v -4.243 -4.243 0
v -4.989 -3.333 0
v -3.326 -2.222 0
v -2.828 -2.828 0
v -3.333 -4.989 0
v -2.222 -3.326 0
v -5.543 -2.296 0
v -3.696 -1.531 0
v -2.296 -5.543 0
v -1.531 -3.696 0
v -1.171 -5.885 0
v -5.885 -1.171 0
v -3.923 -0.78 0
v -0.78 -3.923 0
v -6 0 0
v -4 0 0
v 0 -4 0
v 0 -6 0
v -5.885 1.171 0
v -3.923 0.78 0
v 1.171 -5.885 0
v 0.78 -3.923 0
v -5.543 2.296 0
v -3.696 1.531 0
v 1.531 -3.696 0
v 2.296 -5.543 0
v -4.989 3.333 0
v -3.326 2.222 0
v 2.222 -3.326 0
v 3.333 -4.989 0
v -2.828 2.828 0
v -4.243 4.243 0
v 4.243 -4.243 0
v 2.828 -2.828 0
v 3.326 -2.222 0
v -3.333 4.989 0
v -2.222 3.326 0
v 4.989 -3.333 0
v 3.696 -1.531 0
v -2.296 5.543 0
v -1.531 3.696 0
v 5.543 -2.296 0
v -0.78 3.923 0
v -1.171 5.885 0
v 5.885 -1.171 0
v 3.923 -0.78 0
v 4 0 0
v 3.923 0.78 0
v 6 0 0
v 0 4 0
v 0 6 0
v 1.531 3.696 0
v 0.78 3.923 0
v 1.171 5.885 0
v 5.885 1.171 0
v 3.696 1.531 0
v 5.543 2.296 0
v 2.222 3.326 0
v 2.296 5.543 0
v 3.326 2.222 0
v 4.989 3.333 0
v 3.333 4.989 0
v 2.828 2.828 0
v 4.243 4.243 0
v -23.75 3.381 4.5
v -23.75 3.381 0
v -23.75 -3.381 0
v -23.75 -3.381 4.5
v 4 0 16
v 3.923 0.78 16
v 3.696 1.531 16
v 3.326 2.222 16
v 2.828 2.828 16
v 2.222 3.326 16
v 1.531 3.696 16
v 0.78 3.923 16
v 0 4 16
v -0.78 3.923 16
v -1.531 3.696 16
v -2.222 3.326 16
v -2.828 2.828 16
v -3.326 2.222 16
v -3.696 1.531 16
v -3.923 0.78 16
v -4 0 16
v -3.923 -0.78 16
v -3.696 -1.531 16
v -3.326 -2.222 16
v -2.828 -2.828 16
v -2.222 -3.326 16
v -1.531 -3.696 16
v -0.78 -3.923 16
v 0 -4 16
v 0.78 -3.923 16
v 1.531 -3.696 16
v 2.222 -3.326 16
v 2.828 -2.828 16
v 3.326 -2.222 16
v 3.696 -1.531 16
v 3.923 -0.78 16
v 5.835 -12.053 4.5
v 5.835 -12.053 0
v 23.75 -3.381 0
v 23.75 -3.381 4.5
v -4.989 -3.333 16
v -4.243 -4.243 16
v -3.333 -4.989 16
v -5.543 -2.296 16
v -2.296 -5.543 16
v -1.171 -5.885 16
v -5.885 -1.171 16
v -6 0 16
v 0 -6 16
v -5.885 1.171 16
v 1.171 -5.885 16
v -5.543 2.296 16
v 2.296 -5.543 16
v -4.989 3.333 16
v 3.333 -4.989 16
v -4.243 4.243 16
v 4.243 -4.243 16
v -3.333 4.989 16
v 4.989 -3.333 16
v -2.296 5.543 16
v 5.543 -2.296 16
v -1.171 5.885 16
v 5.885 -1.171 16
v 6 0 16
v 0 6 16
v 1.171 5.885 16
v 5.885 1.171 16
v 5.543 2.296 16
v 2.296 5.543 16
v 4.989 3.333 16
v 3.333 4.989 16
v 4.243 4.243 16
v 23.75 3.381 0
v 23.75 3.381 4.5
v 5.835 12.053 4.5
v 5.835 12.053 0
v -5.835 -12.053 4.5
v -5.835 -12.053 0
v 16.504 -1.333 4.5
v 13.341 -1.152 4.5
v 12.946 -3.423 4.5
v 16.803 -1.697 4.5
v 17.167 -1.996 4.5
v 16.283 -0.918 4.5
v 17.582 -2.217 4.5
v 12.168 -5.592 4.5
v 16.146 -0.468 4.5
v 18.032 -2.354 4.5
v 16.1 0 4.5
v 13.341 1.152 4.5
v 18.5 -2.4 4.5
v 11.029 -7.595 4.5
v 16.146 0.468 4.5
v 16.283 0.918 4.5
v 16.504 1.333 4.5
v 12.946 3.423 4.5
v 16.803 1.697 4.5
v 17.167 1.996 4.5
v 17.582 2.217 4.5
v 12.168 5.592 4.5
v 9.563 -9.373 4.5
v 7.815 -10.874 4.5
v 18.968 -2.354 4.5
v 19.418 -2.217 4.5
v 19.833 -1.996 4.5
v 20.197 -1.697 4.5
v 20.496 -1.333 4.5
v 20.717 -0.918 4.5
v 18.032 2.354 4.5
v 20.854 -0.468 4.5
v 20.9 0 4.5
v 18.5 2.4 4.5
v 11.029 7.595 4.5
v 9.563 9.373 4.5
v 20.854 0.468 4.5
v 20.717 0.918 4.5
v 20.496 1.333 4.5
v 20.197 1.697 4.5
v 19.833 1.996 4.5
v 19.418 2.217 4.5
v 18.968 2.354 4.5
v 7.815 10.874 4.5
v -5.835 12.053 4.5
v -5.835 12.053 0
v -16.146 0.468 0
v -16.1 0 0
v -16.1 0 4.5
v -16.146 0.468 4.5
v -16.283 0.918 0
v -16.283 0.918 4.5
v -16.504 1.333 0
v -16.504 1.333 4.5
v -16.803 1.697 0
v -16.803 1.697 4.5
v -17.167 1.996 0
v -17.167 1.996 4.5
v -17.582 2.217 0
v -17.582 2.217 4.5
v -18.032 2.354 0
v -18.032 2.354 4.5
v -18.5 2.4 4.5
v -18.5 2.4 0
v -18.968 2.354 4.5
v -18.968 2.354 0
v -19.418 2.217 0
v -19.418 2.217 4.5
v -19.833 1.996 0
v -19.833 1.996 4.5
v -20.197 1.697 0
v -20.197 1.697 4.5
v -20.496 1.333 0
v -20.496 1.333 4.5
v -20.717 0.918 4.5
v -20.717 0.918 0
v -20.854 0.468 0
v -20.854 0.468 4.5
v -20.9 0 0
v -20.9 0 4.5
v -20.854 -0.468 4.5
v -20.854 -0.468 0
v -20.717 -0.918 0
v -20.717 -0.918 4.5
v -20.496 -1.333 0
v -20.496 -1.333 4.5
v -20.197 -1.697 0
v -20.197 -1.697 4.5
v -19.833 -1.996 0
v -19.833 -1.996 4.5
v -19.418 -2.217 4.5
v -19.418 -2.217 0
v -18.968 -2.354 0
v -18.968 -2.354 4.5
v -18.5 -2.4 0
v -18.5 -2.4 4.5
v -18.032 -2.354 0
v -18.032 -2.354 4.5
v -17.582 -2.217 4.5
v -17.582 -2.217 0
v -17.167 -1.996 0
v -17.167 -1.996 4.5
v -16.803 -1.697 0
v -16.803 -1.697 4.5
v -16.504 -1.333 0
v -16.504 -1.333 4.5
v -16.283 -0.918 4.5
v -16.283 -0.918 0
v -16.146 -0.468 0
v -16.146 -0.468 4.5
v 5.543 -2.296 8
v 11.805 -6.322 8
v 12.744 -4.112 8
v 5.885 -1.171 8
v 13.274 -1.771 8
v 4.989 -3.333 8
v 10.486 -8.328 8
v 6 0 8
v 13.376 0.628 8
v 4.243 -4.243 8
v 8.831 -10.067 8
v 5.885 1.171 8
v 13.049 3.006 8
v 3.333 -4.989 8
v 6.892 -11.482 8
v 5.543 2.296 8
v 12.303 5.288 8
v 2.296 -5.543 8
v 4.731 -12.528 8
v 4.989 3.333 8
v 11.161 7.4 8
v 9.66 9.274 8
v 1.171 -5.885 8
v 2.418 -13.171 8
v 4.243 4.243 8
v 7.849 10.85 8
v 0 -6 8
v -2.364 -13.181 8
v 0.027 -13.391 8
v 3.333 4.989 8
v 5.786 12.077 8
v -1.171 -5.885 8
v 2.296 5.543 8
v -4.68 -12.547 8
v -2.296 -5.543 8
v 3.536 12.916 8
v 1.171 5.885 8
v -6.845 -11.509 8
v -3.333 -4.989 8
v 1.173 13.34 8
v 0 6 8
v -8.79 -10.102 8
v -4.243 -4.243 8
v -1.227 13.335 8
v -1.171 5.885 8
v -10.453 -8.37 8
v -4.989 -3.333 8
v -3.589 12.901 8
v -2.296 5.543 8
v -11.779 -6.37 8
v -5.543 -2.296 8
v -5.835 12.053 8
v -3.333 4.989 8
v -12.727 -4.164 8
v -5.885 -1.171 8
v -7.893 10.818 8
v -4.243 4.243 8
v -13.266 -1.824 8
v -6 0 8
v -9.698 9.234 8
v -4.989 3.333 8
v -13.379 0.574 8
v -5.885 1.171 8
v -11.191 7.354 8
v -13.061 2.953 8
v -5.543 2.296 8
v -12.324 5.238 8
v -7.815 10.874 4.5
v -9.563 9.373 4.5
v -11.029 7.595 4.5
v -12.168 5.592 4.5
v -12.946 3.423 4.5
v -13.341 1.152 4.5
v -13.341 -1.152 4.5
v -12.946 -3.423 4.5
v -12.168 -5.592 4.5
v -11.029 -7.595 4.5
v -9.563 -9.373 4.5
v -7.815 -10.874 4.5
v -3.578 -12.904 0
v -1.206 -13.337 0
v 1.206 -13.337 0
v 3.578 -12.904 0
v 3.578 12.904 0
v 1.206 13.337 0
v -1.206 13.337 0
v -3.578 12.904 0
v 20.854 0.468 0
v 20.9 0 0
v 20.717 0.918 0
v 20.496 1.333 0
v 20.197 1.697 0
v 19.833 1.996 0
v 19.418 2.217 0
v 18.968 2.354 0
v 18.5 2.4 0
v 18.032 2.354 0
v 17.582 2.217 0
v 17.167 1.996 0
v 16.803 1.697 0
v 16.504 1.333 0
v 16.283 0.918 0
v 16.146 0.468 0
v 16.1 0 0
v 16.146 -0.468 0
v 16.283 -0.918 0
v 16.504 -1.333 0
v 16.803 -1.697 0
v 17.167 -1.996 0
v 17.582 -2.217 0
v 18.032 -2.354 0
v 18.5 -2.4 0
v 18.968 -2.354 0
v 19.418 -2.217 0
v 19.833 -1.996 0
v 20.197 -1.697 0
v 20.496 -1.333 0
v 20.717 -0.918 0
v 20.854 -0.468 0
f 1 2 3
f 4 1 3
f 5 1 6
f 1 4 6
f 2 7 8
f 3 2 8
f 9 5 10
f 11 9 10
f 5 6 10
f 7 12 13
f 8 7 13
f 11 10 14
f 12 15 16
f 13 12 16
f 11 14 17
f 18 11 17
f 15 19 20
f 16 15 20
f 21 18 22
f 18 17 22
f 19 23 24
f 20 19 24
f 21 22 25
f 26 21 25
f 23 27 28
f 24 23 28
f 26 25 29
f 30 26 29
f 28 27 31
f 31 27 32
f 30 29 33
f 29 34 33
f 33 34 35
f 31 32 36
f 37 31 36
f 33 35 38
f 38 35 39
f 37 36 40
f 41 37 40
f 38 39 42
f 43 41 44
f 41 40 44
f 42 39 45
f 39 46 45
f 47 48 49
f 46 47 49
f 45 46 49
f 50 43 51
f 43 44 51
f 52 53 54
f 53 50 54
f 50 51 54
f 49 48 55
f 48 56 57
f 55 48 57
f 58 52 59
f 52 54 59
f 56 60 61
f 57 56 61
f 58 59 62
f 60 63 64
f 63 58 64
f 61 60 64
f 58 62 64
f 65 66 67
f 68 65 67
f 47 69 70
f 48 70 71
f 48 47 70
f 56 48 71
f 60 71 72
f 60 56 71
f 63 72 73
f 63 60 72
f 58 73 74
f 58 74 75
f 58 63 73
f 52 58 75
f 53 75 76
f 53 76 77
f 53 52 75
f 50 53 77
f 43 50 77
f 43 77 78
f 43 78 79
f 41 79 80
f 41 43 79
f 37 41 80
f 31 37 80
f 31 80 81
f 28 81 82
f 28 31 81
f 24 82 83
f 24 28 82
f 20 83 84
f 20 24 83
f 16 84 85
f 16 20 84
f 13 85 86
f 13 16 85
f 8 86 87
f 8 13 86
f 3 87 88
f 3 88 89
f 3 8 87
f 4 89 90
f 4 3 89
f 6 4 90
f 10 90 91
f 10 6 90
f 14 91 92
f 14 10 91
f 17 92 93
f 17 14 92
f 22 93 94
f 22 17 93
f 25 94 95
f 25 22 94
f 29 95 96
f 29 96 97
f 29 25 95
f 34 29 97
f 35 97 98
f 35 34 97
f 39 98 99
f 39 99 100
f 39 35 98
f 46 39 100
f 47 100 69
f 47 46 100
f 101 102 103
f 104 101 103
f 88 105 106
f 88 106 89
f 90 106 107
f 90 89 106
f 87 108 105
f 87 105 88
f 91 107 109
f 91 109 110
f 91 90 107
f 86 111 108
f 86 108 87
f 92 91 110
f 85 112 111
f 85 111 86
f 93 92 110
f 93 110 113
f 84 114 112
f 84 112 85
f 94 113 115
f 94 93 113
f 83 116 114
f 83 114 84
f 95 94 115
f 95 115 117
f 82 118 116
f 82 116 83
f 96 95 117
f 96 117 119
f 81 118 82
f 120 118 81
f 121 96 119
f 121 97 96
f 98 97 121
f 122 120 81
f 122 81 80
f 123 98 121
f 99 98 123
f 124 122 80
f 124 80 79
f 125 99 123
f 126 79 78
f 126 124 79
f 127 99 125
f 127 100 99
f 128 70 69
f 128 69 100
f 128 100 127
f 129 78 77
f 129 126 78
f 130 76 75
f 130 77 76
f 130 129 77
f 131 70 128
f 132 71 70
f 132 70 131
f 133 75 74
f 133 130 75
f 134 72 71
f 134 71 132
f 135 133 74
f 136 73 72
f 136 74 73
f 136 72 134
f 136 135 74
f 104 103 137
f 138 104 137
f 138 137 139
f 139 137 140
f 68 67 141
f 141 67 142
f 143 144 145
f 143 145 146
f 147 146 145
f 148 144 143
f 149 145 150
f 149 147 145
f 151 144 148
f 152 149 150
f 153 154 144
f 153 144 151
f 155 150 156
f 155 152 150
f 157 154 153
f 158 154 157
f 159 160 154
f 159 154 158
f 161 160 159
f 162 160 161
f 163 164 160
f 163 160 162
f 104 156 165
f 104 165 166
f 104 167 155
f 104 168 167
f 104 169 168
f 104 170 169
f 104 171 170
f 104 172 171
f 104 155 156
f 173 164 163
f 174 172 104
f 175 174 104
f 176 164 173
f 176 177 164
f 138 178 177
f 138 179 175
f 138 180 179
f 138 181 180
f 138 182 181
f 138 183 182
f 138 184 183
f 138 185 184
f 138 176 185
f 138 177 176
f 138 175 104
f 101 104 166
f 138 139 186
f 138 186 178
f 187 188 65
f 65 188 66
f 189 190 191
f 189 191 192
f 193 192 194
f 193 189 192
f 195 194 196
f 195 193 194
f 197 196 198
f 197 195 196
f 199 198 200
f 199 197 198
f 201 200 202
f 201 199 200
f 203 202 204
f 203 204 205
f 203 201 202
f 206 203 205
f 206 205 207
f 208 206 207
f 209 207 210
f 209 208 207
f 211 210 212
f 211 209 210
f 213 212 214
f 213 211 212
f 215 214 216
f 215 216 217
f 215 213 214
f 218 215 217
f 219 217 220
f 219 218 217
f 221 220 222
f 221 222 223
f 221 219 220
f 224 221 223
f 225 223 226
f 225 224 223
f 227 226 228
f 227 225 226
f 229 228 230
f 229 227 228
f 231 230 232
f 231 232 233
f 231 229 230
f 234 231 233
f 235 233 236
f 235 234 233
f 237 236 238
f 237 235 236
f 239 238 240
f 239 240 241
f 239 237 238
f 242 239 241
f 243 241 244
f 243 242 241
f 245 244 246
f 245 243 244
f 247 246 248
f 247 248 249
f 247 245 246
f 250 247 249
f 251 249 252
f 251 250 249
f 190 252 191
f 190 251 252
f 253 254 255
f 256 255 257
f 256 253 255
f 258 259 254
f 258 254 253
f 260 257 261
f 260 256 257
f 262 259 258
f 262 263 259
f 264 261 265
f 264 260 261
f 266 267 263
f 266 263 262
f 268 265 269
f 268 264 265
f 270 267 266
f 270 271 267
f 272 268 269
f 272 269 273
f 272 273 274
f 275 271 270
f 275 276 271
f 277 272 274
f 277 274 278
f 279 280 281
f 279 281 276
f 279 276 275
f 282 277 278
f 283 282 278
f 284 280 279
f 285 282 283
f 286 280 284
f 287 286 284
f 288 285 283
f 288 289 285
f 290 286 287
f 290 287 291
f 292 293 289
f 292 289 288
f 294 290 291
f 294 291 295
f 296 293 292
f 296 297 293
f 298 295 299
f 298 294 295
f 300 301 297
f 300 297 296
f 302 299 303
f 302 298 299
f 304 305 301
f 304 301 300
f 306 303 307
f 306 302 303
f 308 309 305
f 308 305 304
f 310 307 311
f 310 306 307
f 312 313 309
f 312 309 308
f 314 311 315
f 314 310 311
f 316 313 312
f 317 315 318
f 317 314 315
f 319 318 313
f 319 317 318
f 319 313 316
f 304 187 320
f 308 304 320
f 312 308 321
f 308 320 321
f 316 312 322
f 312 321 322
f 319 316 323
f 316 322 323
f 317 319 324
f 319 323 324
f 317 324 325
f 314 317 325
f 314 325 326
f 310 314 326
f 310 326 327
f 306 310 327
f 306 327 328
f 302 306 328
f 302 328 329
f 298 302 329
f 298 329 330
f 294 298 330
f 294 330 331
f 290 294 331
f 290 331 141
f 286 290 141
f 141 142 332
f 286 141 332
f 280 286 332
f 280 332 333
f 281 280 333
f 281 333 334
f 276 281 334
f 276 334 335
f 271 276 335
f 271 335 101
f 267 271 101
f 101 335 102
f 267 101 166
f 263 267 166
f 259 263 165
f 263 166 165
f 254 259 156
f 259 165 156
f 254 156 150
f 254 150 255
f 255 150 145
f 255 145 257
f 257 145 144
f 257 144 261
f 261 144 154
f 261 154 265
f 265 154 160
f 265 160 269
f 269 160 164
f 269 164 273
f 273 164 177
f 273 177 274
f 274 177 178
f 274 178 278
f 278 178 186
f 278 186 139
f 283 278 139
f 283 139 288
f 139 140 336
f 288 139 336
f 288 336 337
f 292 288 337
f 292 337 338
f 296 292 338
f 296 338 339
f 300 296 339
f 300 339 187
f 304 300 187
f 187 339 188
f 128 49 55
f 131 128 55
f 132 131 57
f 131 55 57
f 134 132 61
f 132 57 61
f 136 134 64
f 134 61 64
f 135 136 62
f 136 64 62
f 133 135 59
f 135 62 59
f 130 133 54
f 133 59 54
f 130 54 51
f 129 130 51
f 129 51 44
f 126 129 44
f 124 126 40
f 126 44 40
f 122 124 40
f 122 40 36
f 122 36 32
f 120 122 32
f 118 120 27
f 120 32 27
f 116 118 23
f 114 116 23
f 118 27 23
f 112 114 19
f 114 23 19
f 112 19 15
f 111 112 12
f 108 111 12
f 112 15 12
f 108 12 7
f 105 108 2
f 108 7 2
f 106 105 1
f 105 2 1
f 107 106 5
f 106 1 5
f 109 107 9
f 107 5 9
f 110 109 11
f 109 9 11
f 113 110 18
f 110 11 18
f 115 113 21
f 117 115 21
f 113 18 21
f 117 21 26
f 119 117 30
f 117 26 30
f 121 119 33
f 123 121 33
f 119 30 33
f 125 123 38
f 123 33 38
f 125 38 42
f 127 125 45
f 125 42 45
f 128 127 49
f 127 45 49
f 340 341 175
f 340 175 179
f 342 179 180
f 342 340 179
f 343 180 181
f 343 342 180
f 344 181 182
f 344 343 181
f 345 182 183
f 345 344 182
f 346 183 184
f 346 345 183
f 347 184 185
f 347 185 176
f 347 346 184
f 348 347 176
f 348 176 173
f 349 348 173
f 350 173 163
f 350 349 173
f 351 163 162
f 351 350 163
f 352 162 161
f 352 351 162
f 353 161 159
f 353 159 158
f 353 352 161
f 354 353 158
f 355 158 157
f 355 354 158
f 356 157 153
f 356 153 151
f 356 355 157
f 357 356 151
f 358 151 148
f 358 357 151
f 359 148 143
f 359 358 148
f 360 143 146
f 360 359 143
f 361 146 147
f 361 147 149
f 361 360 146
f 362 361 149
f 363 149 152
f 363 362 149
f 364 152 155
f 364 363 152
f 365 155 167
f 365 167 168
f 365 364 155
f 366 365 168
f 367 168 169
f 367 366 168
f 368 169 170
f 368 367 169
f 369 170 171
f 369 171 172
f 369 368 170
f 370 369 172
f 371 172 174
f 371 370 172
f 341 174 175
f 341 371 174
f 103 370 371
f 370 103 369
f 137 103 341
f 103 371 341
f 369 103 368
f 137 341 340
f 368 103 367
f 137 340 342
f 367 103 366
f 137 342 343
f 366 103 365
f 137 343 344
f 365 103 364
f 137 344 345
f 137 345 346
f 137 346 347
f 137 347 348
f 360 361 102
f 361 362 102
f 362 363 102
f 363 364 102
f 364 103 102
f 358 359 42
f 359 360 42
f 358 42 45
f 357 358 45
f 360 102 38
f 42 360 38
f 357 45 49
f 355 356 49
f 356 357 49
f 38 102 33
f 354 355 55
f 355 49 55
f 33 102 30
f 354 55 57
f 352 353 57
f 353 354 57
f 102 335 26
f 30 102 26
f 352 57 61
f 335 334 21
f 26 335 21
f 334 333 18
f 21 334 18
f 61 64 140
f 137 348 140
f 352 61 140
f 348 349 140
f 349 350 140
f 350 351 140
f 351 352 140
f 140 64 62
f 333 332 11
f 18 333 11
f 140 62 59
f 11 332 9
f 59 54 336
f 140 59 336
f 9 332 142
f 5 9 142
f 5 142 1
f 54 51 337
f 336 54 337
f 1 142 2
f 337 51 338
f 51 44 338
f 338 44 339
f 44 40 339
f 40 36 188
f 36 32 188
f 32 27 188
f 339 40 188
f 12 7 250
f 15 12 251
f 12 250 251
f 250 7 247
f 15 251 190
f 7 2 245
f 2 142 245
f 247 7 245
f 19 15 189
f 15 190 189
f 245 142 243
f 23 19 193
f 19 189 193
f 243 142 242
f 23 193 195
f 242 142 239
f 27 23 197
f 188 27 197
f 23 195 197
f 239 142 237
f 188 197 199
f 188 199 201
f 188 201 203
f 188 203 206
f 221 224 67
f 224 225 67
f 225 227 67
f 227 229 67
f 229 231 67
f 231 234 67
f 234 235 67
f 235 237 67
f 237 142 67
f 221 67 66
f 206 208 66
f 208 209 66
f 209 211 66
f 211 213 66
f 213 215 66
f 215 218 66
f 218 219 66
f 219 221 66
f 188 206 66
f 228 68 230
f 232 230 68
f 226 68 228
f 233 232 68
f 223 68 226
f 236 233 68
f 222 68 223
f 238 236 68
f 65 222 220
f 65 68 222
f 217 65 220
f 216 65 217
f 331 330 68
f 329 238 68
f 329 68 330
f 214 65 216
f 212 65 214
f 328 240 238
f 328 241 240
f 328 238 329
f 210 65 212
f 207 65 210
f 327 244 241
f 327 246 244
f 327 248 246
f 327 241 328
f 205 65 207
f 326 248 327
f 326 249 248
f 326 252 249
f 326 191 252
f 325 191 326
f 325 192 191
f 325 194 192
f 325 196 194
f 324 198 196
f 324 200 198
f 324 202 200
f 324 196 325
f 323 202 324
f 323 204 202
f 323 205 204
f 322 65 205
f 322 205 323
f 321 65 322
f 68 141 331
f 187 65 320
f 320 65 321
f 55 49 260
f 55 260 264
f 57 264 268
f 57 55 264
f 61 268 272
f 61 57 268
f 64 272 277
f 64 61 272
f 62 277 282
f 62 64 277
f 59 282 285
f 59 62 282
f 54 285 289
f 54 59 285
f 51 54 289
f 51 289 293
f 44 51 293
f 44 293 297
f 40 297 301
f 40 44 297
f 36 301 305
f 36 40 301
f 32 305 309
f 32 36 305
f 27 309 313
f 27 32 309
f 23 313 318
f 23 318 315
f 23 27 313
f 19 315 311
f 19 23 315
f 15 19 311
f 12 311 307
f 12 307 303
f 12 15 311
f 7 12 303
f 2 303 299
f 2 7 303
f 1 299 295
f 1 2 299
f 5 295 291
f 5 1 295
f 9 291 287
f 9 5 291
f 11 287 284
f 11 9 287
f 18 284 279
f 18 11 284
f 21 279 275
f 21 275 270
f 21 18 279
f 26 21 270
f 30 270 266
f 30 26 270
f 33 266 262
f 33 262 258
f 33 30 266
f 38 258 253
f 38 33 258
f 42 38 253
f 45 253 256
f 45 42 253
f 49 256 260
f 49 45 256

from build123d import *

# Parameters (mm, degrees)
SKETCH_1_R        = 2.4
EXTRUDE_1_DEPTH   = 4.5
EXTRUDE_1_2_DEPTH = 4.5
SKETCH_1_3_R      = 13.391071773
SKETCH_1_3_R_2    = 6
EXTRUDE_2_DEPTH   = 8
SKETCH_1_4_R      = 6
SKETCH_1_4_R_2    = 4
EXTRUDE_3_DEPTH   = 16


with BuildPart() as part:
    # 草图1 → 凸台-拉伸1 (new body)
    with BuildSketch(Plane.XY):
        with BuildLine():
            Line((5.83466248, -12.053112336), (23.75, -3.380667253))
            Line((23.75, -3.380667253), (23.75, 3.380667253))
            Line((23.75, 3.380667253), (5.834662804, 12.053112179))
            ThreePointArc((5.834662804, 12.053112179), (13.391071773, -1.8e-07), (5.83466248, -12.053112336))
        make_face()
        with Locations((18.5, 0)):
            Circle(SKETCH_1_R, mode=Mode.SUBTRACT)
    extrude(amount=EXTRUDE_1_DEPTH)



with BuildPart() as body_2:
    # 草图1 → Extrude 1 2 (new body)
    with BuildSketch(Plane.XY):
        with BuildLine():
            Line((-23.75, -3.380667253), (-5.834662541, -12.053112306))
            ThreePointArc((-5.834662541, -12.053112306), (-13.391071773, -1.46e-07), (-5.834662804, 12.053112179))
            Line((-5.834662804, 12.053112179), (-23.75, 3.380667253))
            Line((-23.75, 3.380667253), (-23.75, -3.380667253))
        make_face()
        with Locations((-18.5, 0)):
            Circle(SKETCH_1_R, mode=Mode.SUBTRACT)
    extrude(amount=EXTRUDE_1_2_DEPTH)


with BuildPart() as part_1:
    add(part.part)

    add(body_2.part)  # 凸台-拉伸2 merges body 2
    # 草图1<3> → 凸台-拉伸2 (add)
    with BuildSketch(Plane.XY):
        Circle(SKETCH_1_3_R)
        Circle(SKETCH_1_3_R_2, mode=Mode.SUBTRACT)
    extrude(amount=EXTRUDE_2_DEPTH)


with BuildPart() as body_2_2:
    # 草图1<4> → 凸台-拉伸3 (new body)
    with BuildSketch(Plane.XY):
        Circle(SKETCH_1_4_R)
        Circle(SKETCH_1_4_R_2, mode=Mode.SUBTRACT)
    extrude(amount=EXTRUDE_3_DEPTH)


solid = Compound([part_1.part, body_2_2.part])
